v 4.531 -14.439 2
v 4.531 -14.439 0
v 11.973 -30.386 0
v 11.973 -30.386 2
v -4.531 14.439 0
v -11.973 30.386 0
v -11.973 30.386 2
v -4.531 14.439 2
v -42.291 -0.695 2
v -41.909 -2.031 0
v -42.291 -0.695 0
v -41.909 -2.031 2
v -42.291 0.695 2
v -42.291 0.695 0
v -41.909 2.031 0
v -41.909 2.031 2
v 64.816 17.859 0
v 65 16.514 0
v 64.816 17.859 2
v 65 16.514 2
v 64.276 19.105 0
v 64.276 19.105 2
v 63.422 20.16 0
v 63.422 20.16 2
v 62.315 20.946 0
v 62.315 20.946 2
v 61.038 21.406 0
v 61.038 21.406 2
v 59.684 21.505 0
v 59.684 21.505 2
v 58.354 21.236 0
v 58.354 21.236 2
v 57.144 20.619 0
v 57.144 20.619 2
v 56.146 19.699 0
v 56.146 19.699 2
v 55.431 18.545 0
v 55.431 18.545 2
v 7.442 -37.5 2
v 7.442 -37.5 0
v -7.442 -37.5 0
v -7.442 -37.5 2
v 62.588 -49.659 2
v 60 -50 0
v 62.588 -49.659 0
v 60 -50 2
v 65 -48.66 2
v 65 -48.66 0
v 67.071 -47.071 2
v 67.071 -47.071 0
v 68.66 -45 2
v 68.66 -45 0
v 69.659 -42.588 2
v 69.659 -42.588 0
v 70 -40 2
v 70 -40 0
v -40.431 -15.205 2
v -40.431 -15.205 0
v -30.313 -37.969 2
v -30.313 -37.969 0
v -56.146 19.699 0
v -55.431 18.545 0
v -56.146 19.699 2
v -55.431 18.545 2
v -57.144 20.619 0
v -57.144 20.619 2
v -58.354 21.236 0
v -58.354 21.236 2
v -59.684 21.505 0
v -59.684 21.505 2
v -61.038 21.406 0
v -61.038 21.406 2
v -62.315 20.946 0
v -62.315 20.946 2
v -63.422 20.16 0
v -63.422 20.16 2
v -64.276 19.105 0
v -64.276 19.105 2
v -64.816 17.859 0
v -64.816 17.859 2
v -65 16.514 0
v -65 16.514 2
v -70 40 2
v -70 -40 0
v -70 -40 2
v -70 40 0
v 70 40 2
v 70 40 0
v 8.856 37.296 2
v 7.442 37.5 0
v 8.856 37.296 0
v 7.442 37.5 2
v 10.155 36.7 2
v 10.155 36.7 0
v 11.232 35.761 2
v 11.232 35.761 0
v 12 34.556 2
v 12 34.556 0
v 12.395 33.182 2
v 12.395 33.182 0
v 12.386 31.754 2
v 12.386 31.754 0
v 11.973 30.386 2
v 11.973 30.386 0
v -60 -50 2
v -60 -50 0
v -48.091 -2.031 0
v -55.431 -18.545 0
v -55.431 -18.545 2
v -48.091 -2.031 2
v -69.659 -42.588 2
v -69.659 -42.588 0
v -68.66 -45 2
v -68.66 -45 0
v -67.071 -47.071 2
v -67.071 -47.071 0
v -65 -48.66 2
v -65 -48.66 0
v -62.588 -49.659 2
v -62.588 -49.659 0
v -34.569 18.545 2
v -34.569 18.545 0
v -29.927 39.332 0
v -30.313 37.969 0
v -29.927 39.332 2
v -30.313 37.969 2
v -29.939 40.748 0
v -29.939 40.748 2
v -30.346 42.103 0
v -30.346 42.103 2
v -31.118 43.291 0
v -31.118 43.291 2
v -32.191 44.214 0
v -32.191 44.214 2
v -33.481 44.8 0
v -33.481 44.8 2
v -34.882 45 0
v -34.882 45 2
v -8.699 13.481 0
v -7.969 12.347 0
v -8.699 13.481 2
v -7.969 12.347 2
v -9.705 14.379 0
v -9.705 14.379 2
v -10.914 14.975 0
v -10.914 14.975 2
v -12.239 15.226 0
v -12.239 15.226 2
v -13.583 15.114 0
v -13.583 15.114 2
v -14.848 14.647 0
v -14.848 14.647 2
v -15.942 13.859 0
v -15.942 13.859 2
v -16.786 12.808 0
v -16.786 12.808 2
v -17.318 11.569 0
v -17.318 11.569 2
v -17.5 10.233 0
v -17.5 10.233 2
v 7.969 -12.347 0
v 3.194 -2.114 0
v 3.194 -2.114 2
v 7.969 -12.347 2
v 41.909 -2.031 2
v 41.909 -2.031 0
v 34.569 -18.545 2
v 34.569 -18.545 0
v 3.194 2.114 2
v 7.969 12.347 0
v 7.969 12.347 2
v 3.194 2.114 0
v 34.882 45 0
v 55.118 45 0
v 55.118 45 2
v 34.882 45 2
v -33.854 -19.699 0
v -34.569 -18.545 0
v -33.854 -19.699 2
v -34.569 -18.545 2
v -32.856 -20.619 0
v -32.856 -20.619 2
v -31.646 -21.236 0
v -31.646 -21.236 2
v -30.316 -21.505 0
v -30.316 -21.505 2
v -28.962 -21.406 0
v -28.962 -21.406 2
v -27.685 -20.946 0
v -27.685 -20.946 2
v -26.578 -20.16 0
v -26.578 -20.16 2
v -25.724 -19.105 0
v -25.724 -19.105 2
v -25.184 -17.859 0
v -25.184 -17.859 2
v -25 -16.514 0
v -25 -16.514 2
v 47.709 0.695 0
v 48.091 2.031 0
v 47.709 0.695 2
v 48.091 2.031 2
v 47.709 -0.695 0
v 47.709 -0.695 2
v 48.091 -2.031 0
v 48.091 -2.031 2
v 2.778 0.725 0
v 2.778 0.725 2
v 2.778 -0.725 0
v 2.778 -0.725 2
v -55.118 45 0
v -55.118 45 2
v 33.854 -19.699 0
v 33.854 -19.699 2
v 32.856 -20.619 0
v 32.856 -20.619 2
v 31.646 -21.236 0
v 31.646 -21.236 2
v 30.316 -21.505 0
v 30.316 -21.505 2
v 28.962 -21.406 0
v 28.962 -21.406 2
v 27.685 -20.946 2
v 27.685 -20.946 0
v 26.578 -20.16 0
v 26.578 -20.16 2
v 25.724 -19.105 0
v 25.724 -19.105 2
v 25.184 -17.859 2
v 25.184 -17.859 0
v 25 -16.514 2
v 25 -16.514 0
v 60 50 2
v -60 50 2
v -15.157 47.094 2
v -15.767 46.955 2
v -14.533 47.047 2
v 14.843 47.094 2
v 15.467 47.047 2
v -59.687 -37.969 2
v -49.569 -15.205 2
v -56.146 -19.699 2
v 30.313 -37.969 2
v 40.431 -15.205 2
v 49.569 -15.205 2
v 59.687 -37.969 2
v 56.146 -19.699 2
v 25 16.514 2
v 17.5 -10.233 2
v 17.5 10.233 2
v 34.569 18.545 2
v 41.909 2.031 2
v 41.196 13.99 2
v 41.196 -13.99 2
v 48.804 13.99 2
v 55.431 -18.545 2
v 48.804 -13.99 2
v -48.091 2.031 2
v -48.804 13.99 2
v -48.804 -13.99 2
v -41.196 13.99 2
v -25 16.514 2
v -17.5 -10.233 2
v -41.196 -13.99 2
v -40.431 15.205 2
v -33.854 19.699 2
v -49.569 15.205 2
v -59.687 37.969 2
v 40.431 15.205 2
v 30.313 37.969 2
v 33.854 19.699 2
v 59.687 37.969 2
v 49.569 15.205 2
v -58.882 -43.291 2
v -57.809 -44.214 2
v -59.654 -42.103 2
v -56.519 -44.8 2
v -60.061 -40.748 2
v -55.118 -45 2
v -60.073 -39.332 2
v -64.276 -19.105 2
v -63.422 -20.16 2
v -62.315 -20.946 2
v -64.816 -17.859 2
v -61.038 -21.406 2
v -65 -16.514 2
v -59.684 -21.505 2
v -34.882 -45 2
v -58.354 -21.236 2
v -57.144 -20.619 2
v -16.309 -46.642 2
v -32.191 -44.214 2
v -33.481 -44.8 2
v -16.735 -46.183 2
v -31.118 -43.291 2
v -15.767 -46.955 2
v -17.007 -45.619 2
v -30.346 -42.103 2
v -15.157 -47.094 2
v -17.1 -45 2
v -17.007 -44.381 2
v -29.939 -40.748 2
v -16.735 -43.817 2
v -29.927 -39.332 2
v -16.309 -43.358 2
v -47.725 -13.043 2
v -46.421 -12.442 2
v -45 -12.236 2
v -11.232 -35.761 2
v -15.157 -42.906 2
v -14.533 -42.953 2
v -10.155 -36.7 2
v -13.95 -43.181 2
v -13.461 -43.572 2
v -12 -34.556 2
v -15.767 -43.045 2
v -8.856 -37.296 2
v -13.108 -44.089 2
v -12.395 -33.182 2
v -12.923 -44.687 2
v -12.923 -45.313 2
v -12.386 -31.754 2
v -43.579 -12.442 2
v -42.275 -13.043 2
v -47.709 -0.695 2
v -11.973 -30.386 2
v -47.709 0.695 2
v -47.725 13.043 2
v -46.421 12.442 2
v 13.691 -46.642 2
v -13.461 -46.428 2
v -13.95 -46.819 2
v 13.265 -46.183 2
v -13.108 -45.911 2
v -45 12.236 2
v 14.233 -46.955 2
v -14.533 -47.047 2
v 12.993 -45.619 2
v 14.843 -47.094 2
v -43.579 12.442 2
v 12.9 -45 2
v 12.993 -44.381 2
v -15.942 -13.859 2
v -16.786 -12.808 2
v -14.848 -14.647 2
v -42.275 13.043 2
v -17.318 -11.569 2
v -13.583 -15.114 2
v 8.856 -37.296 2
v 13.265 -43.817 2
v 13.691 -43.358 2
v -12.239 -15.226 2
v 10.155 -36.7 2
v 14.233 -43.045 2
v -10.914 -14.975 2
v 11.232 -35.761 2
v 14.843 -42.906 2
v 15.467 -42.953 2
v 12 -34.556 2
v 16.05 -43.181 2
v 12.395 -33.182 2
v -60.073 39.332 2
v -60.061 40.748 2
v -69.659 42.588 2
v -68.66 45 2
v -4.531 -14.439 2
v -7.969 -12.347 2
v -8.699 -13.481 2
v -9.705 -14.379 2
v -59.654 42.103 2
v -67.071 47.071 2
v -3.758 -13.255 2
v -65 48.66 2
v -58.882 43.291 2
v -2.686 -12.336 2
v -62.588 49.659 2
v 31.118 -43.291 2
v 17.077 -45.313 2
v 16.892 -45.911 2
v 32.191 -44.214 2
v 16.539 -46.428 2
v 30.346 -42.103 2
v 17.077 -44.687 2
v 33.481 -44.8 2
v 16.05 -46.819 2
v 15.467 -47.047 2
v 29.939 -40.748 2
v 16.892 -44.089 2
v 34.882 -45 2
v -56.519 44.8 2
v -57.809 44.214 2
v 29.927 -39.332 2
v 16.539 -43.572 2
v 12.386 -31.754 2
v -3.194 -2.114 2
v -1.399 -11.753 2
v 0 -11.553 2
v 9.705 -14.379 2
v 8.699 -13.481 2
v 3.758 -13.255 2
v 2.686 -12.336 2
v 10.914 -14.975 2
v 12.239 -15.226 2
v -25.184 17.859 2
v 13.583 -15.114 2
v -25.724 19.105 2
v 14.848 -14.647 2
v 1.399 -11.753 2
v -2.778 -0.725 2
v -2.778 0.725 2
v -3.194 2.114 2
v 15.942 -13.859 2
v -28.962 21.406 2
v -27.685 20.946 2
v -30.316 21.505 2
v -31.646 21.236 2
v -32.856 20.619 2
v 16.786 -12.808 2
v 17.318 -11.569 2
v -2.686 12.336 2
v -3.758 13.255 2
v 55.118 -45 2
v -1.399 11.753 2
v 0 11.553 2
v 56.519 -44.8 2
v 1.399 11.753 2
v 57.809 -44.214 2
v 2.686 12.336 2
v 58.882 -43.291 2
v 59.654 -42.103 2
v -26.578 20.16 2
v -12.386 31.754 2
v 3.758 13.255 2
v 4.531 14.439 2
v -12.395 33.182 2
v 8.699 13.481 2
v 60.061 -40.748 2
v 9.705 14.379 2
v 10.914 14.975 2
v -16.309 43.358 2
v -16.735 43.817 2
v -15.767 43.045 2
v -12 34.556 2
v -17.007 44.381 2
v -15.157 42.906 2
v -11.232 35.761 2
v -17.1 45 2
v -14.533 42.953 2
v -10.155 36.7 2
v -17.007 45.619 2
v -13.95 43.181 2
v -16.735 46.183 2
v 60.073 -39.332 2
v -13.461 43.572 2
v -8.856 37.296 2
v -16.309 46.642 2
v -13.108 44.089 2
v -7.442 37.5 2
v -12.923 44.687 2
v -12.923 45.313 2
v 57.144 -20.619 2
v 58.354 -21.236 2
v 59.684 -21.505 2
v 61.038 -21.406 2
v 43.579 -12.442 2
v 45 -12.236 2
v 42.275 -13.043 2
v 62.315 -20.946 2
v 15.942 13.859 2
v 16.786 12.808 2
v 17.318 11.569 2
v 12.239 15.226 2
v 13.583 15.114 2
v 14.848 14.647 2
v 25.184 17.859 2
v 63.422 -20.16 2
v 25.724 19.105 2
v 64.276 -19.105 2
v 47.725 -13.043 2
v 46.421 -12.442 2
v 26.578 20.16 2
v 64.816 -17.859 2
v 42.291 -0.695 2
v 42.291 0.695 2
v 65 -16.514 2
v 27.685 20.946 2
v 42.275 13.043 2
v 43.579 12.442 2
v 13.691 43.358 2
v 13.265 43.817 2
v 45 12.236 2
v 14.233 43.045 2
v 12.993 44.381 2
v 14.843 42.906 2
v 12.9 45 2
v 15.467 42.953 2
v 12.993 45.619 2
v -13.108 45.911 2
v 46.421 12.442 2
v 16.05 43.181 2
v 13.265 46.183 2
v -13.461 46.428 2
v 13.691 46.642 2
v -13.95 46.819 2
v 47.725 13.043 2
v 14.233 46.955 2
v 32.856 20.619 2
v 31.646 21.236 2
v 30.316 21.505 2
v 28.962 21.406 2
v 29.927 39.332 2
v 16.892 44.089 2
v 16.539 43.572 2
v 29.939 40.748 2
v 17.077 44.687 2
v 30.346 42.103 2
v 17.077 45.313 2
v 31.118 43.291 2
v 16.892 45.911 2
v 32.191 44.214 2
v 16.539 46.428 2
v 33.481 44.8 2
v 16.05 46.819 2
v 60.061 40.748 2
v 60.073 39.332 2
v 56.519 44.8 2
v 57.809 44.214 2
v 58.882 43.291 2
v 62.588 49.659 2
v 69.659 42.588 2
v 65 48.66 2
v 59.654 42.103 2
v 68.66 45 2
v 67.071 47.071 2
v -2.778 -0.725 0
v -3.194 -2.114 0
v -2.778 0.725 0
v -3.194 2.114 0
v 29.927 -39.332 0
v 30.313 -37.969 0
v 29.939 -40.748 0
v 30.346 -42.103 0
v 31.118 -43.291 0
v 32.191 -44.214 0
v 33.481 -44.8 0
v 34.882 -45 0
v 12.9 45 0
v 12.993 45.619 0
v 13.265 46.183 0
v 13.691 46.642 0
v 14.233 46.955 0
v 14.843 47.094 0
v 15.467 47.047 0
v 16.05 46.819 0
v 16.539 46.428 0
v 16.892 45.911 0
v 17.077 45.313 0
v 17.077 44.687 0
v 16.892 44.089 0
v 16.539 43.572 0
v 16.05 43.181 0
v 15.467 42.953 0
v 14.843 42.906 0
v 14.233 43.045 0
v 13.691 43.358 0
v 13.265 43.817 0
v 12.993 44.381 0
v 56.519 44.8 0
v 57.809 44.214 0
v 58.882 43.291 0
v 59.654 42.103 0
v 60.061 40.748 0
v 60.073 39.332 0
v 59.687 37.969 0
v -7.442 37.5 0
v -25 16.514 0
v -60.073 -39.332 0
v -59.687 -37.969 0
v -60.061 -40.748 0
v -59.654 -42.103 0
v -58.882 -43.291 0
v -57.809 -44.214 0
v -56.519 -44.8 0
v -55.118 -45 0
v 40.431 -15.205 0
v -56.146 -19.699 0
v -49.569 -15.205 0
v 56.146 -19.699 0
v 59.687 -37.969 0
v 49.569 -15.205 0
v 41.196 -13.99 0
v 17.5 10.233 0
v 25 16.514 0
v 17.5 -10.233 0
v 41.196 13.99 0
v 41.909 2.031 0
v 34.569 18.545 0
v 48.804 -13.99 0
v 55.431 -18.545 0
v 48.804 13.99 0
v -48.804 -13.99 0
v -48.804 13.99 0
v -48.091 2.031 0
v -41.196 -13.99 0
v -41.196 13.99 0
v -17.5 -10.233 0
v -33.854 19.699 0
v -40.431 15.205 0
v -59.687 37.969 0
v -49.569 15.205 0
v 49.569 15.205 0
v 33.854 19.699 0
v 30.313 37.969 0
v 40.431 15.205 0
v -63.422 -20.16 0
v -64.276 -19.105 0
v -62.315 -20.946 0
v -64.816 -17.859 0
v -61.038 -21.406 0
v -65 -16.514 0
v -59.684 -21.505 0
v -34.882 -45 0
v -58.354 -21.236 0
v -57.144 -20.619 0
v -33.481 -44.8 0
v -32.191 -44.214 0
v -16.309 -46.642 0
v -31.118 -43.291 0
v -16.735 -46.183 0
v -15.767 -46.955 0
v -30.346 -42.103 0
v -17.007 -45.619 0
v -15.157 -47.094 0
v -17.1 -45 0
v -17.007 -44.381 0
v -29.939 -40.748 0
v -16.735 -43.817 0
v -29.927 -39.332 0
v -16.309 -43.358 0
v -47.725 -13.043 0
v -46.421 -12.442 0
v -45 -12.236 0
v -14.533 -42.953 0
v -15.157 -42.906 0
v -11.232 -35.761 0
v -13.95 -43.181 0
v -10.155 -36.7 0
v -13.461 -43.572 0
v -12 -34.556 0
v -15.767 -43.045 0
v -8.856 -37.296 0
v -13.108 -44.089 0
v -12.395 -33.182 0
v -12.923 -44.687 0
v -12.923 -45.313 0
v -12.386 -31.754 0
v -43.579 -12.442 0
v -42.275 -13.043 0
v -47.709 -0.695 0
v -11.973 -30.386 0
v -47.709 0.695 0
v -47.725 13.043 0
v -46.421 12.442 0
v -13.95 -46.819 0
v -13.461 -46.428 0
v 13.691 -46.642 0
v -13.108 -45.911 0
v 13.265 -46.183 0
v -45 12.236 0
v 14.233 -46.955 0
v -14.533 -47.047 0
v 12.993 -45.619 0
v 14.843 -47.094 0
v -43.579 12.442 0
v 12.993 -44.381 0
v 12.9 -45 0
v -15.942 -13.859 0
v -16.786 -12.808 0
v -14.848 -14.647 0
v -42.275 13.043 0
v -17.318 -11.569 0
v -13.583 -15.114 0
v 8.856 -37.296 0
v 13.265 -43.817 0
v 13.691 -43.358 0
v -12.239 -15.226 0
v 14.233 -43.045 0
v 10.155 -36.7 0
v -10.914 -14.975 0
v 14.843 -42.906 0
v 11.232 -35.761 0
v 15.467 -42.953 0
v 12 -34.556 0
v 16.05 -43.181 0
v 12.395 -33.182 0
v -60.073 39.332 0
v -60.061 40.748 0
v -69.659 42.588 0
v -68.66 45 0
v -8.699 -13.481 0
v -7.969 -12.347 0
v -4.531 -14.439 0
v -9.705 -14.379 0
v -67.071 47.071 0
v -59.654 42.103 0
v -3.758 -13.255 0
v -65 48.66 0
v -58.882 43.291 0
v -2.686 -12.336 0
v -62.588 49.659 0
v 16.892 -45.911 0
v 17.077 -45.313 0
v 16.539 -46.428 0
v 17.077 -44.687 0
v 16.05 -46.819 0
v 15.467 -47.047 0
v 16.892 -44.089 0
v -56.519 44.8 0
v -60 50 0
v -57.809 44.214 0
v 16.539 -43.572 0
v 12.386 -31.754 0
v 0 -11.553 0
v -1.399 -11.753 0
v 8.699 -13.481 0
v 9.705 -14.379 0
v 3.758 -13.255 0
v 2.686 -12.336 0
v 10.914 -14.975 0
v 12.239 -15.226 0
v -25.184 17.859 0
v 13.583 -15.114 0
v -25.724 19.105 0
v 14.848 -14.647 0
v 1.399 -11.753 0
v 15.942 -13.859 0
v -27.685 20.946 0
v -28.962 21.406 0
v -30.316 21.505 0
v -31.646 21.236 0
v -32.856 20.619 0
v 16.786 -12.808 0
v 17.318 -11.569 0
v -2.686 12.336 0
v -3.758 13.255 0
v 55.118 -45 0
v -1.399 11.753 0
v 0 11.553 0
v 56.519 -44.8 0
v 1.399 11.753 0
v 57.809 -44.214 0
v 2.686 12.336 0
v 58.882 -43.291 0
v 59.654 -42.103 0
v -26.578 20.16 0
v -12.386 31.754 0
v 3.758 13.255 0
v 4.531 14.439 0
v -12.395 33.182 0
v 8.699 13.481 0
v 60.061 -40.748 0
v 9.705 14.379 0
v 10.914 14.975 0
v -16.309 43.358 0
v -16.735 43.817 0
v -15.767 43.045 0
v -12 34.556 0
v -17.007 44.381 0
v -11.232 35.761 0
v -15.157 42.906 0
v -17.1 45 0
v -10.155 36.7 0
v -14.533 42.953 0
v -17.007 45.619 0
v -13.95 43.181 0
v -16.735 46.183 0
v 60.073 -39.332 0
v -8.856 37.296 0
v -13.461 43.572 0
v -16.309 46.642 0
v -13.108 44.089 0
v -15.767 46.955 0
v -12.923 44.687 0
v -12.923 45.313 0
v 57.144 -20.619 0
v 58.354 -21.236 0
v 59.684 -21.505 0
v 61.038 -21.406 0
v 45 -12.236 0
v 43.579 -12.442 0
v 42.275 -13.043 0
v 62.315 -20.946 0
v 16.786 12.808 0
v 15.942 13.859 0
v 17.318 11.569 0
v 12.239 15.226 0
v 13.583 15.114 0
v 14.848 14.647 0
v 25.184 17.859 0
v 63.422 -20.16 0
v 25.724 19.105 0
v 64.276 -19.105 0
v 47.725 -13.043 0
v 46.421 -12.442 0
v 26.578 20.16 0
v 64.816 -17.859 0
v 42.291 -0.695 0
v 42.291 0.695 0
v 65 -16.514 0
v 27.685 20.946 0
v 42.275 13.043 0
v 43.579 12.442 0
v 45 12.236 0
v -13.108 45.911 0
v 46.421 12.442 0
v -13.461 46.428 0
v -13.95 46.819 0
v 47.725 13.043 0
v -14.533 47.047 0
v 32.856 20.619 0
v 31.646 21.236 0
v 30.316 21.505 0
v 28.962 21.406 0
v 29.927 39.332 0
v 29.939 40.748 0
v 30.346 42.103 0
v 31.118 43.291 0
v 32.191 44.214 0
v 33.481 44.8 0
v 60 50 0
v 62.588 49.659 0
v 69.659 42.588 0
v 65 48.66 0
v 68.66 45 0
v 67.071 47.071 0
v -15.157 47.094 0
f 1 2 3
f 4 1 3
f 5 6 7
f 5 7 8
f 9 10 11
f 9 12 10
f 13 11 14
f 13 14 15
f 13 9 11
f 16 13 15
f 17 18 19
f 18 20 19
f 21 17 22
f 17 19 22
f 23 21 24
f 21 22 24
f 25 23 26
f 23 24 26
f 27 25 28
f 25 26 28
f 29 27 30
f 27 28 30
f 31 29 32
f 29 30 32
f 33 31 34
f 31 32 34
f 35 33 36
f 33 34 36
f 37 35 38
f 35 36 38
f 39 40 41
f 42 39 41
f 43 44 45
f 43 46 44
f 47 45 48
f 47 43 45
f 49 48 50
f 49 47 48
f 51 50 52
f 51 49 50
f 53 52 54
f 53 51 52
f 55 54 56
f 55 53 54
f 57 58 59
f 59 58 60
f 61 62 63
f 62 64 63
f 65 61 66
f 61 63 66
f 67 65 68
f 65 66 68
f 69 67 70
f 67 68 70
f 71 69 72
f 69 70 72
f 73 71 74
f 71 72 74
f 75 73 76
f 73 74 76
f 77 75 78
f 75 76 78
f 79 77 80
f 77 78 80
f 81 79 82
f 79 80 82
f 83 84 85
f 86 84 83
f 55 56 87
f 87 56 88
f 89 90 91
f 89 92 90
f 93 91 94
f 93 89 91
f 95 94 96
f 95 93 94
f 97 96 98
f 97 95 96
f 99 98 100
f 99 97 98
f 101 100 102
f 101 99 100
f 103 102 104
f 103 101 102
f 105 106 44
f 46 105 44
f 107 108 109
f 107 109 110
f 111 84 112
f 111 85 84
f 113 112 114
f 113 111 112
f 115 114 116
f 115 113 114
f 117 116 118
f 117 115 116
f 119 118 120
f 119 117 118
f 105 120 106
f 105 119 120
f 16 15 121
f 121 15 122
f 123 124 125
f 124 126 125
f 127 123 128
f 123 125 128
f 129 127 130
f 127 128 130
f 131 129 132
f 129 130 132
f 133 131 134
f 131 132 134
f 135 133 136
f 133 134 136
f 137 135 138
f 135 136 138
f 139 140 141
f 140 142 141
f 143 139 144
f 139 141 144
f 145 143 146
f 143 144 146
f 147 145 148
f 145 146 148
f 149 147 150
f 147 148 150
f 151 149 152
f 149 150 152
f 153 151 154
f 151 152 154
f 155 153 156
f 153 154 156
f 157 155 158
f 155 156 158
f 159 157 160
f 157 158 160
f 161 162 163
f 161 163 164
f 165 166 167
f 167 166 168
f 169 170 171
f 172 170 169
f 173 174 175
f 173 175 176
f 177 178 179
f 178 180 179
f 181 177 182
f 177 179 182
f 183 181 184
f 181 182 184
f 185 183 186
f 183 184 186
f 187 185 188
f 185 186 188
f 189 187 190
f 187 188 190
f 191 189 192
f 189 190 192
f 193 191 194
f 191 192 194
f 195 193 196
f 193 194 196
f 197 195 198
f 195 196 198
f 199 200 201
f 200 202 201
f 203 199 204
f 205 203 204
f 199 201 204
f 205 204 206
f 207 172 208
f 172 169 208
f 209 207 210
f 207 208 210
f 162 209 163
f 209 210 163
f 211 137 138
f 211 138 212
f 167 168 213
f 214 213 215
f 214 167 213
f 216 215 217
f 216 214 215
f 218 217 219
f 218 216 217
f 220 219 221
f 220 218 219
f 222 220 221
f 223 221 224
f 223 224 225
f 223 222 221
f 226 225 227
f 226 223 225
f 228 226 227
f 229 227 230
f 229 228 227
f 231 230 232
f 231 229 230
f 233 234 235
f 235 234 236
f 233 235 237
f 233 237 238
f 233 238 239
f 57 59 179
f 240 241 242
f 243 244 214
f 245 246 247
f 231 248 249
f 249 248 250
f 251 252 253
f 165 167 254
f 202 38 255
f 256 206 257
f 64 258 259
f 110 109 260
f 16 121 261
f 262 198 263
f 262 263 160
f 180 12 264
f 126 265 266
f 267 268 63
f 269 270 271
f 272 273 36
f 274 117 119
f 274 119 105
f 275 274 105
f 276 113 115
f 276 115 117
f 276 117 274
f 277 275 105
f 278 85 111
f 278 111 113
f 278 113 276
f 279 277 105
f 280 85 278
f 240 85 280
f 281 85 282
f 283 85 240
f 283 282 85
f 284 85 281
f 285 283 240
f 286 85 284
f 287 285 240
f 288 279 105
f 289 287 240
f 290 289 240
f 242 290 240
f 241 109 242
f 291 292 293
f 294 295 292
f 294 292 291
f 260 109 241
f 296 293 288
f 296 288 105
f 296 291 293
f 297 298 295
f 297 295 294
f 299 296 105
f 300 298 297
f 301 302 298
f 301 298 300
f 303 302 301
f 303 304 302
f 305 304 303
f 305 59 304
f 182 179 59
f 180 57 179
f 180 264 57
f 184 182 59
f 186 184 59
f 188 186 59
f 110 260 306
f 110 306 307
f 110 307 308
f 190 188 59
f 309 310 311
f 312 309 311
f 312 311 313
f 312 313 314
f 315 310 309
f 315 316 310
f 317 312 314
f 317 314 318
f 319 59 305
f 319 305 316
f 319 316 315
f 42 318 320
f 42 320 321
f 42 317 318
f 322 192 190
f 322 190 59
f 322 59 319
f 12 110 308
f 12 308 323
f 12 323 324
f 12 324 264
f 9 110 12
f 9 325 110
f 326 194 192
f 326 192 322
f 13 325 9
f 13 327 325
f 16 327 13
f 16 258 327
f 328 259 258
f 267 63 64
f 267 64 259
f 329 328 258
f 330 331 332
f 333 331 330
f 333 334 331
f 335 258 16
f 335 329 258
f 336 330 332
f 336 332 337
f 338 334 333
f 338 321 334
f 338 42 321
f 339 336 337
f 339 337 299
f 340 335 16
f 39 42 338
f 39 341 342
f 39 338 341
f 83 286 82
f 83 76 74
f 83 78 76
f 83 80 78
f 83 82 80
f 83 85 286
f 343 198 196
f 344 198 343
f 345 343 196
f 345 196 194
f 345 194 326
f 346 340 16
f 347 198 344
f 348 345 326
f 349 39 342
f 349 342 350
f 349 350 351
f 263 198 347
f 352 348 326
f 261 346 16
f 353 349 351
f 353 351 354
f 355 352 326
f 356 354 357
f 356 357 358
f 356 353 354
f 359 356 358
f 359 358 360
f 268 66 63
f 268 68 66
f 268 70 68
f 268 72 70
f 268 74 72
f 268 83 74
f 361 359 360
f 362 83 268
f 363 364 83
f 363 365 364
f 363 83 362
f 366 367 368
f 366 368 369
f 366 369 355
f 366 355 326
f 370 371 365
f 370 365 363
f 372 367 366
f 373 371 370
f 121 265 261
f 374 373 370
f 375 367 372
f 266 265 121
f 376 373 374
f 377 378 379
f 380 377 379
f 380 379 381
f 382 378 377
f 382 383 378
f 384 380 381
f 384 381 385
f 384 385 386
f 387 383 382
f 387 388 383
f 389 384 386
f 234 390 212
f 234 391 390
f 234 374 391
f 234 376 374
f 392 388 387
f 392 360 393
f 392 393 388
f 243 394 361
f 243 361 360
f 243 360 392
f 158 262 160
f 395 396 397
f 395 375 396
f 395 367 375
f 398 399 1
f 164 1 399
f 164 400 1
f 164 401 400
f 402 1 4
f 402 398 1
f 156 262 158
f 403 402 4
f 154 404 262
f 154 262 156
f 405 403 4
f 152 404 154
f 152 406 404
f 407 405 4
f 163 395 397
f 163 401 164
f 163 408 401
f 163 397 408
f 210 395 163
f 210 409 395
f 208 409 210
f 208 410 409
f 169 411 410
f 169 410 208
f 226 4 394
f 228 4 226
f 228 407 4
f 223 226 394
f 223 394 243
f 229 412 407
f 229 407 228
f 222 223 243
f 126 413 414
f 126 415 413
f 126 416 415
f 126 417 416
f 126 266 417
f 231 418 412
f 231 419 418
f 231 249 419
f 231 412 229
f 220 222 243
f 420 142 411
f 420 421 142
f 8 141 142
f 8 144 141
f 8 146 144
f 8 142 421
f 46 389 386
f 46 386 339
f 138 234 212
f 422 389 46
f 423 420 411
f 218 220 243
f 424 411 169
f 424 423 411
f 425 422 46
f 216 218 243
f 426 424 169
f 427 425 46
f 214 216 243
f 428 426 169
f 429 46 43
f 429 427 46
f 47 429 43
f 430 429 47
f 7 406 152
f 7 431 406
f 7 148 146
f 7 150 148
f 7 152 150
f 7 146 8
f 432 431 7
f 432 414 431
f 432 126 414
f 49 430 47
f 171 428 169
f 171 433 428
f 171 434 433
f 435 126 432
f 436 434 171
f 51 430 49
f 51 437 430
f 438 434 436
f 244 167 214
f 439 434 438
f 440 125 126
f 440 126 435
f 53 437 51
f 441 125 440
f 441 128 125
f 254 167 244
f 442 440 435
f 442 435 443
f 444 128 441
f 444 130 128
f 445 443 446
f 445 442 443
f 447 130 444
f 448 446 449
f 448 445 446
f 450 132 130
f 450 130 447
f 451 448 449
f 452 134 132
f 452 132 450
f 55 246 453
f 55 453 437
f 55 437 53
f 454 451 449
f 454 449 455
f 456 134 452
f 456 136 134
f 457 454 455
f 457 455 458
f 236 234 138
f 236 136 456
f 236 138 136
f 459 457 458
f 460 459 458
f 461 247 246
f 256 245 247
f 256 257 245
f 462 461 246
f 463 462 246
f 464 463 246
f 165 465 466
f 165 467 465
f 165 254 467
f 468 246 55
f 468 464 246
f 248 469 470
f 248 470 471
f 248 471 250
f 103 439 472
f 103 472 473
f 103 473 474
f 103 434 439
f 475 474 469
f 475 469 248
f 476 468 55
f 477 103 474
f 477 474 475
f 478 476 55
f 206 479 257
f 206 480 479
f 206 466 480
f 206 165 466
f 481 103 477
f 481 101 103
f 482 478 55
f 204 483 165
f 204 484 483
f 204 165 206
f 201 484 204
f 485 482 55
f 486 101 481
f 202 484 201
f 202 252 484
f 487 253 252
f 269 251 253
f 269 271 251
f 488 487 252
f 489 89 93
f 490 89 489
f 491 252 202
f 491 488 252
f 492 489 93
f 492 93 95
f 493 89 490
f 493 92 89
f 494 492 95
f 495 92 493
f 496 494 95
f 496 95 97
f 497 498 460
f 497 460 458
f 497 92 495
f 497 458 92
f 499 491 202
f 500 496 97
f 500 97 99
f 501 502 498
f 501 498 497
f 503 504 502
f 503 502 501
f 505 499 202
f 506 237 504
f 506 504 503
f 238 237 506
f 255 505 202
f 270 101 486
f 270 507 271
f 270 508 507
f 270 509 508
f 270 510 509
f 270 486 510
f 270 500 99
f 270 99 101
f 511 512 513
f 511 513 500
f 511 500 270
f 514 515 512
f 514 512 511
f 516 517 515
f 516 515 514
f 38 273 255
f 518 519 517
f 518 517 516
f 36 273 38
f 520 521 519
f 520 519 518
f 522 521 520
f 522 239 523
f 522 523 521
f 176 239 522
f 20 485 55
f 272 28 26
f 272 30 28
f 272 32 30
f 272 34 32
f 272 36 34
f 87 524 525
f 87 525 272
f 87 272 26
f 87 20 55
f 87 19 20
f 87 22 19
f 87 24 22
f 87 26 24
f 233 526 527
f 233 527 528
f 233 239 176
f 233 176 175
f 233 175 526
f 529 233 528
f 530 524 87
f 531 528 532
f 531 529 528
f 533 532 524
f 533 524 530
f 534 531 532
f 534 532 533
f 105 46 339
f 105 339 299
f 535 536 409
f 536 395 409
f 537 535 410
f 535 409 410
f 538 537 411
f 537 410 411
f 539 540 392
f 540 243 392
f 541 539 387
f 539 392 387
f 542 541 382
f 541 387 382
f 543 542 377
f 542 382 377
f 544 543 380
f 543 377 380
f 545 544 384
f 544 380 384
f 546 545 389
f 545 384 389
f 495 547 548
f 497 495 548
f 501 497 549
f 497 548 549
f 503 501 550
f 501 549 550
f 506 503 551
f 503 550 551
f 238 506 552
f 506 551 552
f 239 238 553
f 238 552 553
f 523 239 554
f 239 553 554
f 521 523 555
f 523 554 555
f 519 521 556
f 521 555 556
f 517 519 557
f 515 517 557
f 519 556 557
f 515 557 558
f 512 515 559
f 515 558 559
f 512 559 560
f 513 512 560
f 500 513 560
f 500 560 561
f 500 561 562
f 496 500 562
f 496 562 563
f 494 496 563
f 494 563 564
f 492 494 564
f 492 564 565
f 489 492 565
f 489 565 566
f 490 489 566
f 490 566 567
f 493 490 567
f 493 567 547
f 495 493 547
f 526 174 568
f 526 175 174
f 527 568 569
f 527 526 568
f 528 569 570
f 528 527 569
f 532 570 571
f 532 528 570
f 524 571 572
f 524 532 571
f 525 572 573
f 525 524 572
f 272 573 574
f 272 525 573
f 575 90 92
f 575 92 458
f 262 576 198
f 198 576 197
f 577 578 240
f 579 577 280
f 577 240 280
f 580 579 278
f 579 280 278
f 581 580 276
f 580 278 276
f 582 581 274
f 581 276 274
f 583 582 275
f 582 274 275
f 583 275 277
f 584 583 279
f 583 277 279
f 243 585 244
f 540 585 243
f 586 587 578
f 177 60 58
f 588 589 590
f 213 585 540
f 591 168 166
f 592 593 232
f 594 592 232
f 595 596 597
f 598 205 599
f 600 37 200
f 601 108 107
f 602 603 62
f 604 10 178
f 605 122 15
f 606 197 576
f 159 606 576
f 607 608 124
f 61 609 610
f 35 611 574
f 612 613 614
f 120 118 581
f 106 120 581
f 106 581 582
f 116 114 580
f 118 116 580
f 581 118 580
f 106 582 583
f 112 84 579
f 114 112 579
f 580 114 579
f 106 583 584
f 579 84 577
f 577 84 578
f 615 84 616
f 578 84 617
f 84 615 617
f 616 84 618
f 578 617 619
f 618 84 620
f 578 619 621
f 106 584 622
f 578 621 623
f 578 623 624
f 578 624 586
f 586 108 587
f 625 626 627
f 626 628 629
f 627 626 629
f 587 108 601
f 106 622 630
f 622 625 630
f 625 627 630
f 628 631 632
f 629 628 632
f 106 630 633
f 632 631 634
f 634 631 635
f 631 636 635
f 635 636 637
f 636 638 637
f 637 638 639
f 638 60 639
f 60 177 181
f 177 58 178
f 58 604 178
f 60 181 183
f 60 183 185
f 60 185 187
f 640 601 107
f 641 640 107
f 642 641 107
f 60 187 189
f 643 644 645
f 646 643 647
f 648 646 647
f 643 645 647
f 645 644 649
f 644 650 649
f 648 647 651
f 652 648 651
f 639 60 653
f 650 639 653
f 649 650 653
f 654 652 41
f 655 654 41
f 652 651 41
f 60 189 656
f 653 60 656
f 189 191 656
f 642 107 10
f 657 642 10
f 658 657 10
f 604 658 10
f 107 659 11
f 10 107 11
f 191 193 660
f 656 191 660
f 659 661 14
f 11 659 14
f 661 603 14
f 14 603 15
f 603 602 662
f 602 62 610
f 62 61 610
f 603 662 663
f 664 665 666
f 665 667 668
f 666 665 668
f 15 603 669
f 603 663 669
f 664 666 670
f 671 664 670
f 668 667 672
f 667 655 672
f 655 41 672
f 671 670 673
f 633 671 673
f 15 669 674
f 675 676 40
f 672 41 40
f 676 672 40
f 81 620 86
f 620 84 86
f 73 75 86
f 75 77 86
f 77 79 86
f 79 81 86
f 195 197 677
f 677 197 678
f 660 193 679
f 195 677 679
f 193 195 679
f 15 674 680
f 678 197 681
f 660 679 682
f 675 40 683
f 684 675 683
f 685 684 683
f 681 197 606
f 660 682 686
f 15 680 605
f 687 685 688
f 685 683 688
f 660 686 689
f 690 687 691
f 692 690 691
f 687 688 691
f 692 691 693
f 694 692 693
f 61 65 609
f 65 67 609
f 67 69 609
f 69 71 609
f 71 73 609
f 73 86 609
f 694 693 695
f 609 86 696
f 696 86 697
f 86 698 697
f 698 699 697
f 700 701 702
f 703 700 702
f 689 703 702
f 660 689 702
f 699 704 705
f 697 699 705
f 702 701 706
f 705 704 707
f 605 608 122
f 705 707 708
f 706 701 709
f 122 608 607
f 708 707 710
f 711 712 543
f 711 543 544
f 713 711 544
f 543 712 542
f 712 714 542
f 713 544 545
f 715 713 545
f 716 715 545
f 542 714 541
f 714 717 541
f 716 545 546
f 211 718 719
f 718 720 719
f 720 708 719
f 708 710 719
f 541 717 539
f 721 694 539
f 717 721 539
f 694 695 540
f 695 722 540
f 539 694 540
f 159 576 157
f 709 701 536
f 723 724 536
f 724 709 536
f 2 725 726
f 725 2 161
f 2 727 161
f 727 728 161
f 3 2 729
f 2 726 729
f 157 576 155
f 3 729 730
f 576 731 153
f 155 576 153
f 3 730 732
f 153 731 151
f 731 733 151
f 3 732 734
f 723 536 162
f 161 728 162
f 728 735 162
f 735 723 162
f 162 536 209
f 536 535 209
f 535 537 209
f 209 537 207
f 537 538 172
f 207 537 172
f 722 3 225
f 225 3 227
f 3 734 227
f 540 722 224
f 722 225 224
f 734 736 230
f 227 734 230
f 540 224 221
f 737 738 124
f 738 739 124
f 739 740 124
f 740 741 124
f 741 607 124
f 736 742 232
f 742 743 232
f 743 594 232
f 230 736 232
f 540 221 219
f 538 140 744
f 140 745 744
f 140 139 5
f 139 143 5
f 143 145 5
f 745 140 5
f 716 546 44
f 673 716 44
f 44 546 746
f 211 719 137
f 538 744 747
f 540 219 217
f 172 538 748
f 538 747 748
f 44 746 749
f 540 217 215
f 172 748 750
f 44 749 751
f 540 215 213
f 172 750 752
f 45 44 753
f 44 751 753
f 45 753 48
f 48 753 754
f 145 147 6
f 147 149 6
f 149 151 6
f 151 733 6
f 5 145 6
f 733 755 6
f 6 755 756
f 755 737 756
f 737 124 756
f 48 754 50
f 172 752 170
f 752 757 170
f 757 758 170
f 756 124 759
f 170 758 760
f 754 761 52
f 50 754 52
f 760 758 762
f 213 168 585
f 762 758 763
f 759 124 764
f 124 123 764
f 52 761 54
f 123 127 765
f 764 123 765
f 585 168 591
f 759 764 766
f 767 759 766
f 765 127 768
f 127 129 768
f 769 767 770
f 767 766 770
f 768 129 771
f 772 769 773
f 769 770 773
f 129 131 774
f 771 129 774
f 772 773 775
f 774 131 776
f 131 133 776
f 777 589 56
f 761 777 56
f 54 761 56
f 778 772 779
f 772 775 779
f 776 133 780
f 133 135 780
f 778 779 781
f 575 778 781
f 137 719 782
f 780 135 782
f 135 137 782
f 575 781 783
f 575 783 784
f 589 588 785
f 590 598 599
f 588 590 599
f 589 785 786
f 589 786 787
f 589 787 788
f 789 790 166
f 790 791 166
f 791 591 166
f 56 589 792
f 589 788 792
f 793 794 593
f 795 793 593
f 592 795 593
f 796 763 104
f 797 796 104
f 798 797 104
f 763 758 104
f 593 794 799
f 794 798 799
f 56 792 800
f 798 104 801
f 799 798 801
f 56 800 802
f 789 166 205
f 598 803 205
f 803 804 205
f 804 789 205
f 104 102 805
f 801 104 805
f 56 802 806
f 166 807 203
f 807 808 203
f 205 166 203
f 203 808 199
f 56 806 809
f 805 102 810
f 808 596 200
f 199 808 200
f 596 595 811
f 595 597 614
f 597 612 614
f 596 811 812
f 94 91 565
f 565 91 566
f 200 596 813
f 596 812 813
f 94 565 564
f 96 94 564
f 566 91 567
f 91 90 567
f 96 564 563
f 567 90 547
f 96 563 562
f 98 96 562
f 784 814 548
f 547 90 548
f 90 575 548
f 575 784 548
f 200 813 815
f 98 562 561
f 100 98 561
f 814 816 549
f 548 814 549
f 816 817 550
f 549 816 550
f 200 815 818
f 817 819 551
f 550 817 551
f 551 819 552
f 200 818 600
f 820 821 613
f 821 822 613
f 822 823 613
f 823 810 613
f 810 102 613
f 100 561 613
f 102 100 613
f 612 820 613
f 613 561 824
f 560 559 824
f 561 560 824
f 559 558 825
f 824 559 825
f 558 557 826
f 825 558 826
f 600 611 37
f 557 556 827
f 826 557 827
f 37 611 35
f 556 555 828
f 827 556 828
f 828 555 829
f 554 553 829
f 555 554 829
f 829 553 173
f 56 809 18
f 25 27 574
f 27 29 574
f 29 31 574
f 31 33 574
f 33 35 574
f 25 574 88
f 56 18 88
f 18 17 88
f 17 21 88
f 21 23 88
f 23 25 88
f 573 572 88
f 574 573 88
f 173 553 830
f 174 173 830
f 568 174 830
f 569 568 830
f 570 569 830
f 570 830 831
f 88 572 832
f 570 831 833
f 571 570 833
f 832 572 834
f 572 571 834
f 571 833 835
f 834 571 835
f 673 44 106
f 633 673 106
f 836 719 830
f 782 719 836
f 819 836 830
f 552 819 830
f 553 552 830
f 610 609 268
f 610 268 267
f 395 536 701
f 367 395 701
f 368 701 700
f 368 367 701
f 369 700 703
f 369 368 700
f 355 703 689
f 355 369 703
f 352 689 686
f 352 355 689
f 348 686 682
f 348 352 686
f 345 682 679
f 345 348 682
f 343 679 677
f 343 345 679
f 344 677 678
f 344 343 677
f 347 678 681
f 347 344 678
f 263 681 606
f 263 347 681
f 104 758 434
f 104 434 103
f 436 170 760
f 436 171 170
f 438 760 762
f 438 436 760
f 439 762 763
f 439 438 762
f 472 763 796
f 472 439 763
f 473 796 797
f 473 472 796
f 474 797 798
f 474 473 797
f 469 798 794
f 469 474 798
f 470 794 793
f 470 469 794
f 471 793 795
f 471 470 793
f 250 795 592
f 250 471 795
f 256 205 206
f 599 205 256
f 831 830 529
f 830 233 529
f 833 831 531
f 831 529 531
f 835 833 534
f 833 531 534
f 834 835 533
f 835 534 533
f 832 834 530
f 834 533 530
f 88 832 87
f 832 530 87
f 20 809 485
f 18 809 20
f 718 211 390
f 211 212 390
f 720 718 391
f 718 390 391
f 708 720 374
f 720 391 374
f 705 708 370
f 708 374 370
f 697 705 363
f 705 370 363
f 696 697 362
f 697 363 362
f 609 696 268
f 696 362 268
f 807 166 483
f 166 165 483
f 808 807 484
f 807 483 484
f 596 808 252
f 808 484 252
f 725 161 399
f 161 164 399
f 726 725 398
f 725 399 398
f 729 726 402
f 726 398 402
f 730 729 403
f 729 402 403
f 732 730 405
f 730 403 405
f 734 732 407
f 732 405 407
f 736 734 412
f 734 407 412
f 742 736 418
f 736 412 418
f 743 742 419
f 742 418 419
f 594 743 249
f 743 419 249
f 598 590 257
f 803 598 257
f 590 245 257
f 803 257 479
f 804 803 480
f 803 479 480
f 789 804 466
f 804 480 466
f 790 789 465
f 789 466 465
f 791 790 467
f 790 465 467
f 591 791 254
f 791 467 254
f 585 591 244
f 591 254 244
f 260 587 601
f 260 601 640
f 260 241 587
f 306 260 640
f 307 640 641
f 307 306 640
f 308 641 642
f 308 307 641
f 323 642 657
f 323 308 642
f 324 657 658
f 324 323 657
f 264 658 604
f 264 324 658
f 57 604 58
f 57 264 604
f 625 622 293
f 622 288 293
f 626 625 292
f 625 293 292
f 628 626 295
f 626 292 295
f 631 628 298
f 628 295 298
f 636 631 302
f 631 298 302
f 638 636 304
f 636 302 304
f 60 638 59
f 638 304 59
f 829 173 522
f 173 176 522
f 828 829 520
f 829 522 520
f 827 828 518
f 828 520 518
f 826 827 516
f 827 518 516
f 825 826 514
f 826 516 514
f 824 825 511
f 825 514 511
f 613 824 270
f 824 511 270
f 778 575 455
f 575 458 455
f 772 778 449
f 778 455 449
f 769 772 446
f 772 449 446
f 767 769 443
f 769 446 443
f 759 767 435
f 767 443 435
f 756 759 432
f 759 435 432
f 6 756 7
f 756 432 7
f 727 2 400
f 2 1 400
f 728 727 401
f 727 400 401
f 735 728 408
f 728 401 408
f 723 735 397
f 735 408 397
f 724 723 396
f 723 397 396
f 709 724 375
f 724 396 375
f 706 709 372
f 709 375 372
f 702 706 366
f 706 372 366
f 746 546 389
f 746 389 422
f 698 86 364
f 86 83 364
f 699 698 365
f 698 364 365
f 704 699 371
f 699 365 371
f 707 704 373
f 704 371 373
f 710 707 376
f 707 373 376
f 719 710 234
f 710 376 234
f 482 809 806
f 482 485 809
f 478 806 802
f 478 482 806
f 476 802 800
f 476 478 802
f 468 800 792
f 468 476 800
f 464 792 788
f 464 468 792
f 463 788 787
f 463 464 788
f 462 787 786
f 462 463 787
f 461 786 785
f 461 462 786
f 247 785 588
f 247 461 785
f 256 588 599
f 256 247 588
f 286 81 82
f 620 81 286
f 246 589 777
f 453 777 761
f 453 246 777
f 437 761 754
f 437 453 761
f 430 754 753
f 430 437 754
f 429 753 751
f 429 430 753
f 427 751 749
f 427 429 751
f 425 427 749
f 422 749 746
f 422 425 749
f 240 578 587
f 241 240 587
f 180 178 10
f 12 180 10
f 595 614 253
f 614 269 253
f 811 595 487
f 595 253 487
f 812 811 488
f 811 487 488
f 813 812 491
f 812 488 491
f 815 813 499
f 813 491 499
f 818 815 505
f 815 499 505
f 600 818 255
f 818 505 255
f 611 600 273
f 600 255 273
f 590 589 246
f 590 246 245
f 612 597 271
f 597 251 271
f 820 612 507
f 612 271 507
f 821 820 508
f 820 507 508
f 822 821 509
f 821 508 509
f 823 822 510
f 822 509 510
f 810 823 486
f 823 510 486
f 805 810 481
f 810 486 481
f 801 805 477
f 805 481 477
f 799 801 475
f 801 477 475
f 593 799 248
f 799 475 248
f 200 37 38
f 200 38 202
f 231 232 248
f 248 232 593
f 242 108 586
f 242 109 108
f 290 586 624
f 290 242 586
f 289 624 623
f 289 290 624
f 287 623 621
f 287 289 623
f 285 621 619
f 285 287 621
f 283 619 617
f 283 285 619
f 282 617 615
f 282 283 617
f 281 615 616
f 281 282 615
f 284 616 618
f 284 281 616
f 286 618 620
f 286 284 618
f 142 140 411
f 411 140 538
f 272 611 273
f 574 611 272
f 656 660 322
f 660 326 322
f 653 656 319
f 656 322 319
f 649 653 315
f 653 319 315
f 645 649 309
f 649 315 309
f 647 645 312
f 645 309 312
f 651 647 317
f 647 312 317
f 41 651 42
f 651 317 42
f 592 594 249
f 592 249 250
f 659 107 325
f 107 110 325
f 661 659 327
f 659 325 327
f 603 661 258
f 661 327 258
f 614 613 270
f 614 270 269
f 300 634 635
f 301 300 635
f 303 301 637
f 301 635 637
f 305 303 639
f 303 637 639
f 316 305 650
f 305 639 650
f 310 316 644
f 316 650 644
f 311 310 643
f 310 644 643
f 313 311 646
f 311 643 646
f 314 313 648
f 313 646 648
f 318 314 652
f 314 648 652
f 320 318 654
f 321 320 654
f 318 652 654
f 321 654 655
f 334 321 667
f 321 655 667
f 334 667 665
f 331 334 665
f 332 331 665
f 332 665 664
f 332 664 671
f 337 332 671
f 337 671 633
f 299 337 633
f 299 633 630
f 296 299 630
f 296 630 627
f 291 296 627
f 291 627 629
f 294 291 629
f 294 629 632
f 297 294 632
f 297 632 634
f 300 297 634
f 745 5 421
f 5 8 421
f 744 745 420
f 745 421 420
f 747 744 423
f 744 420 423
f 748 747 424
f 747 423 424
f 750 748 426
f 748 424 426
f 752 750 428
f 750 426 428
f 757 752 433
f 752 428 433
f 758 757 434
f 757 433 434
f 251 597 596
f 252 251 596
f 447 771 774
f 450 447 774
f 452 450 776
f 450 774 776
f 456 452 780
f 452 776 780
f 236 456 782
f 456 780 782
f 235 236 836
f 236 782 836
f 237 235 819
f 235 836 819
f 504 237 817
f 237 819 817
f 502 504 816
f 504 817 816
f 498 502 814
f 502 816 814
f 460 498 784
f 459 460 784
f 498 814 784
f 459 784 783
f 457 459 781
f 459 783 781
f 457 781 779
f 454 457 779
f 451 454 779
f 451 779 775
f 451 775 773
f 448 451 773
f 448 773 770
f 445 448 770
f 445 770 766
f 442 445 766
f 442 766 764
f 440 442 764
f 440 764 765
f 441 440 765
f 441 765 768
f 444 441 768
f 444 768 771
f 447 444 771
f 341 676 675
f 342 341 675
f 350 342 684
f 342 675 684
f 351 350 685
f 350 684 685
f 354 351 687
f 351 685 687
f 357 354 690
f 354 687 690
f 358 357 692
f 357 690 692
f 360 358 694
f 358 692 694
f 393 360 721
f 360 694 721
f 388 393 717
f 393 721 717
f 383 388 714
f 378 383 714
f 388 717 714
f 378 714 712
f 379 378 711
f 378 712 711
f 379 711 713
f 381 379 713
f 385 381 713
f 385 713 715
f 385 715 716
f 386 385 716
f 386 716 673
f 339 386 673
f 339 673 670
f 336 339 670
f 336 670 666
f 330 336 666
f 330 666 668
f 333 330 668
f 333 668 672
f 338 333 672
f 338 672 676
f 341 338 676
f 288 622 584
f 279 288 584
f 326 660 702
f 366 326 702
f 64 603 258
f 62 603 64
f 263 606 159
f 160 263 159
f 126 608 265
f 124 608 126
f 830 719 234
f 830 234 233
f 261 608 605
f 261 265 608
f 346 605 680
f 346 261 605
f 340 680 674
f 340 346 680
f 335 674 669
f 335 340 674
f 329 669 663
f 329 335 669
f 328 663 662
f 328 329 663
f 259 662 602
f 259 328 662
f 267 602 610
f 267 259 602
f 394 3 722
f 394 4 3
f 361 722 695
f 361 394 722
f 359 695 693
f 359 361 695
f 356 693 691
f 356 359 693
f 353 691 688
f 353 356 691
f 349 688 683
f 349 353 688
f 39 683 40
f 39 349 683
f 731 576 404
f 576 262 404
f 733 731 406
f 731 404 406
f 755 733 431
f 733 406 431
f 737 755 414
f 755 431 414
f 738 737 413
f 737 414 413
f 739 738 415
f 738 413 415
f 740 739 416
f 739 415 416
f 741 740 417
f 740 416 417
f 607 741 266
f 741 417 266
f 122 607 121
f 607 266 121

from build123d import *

# Parameters (mm, degrees)
SKETCH_1_W          = 140
SKETCH_1_H          = 100
EXTRUDE_1_DEPTH     = 2
SKETCH_3_R          = 2.1
CUT_EXTRUDE_2_DEPTH = 10
CUT_EXTRUDE_3_DEPTH = 10
FILLET_1_R          = 5
FILLET_2_R          = 10


with BuildPart() as part:
    # 草图1 → 凸台-拉伸1 (new body)
    with BuildSketch(Plane.XY):
        Rectangle(SKETCH_1_W, SKETCH_1_H)
    extrude(amount=EXTRUDE_1_DEPTH)

    # 草图3 → 切除-拉伸2 (cut)
    with BuildSketch(Plane(origin=(0, 0, 0), x_dir=(-1, 0, 0), z_dir=(0, 0, -1))):
        with Locations((-15, -45)):
            Circle(SKETCH_3_R)
        with Locations((15, -45)):
            Circle(SKETCH_3_R)
        with Locations((15, 45)):
            Circle(SKETCH_3_R)
        with Locations((-15, 45)):
            Circle(SKETCH_3_R)
    extrude(amount=-CUT_EXTRUDE_2_DEPTH, mode=Mode.SUBTRACT)

    # 草图4 → 切除-拉伸3 (cut)
    with BuildSketch(Plane(origin=(0, 0, 0), x_dir=(-1, 0, 0), z_dir=(0, 0, -1))):
        Polygon((-17.5, 32.770587041), (-2.207059381, 0), (-17.5, -32.770587041), align=None)
        Polygon((-15.292940619, -37.5), (15.292940619, -37.5), (0, -4.729412959), align=None)
        Polygon((-15.292940619, 37.5), (15.292940619, 37.5), (0, 4.729412959), align=None)
        Polygon((17.5, -32.770587041), (17.5, 32.770587041), (2.207059381, 0), align=None)
        Polygon((-62.811364933, -45), (-45, -4.924428901), (-27.188635067, -45), align=None)
        Polygon((-65, -40.075571099), (-65, 40.075571099), (-47.188635067, 0), align=None)
        Polygon((-62.811364933, 45), (-27.188635067, 45), (-45, 4.924428901), align=None)
        Polygon((-25, -40.075571099), (-25, 40.075571099), (-42.811364933, 0), align=None)
        Polygon((42.811364933, 0), (25, 40.075571099), (25, -40.075571099), align=None)
        Polygon((45, -4.924428901), (27.188635067, -45), (62.811364933, -45), align=None)
        Polygon((45, 4.924428901), (27.188635067, 45), (62.811364933, 45), align=None)
        Polygon((65, -40.075571099), (47.188635067, 0), (65, 40.075571099), align=None)
    extrude(amount=-CUT_EXTRUDE_3_DEPTH, mode=Mode.SUBTRACT)

    # 圆角1
    fillet_1_edges = [part.edges().sort_by_distance(p)[0] for p in [
        (-62.811364933, 45, 1),
        (-45, 4.924428901, 1),
        (-27.188635067, 45, 1),
        (-65, 40.075571099, 1),
        (-65, -40.075571099, 1),
        (-47.188635067, 0, 1),
        (-45, -4.924428901, 1),
        (-62.811364933, -45, 1),
        (-27.188635067, -45, 1),
        (-2.207059381, 0, 1),
        (-17.5, 32.770587041, 1),
        (-17.5, -32.770587041, 1),
        (0, 4.729412959, 1),
        (15.292940619, 37.5, 1),
        (-15.292940619, 37.5, 1),
        (15.292940619, -37.5, 1),
        (0, -4.729412959, 1),
        (-15.292940619, -37.5, 1),
        (45, 4.924428901, 1),
        (62.811364933, 45, 1),
        (27.188635067, 45, 1),
        (65, 40.075571099, 1),
        (47.188635067, 0, 1),
        (65, -40.075571099, 1),
        (17.5, -32.770587041, 1),
        (17.5, 32.770587041, 1),
        (2.207059381, 0, 1),
        (-42.811364933, 0, 1),
        (-25, -40.075571099, 1),
        (-25, 40.075571099, 1),
        (27.188635067, -45, 1),
        (62.811364933, -45, 1),
        (45, -4.924428901, 1),
        (42.811364933, 0, 1),
        (25, 40.075571099, 1),
        (25, -40.075571099, 1),
    ]]
    fillet(fillet_1_edges, radius=FILLET_1_R)

    # 圆角2
    fillet_2_edges = [part.edges().sort_by_distance(p)[0] for p in [
        (-70, 50, 1),
        (70, 50, 1),
        (70, -50, 1),
        (-70, -50, 1),
    ]]
    fillet(fillet_2_edges, radius=FILLET_2_R)


solid = part.part
